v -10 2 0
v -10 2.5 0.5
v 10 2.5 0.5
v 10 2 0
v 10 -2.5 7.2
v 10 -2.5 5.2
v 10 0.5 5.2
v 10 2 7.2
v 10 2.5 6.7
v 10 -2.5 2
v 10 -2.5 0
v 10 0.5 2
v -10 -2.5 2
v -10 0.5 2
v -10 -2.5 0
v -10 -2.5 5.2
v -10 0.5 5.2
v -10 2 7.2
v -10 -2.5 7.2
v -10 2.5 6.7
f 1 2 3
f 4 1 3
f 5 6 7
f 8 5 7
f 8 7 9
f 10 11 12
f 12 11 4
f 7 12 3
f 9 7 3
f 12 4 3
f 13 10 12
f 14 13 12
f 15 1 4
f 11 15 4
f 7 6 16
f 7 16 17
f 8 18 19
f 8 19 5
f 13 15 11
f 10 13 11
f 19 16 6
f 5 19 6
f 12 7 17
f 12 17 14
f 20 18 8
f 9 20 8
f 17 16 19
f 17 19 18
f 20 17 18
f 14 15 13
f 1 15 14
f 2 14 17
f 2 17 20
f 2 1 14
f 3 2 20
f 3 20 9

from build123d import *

# Parameters (mm, degrees)
SKETCH2_W           = 20
SKETCH2_H           = 5
BOSS_EXTRUDE1_DEPTH = 7.2
CUT_EXTRUDE1_REACH  = 23.403
SKETCH3_W           = 3.2
SKETCH3_H           = 3
CHAMFER1_SIZE       = 0.5


with BuildPart() as part:
    # Sketch2 → Boss-Extrude1 (new body)
    with BuildSketch(Plane.XY):
        Rectangle(SKETCH2_W, SKETCH2_H)
    extrude(amount=BOSS_EXTRUDE1_DEPTH)

    # Sketch3 → Cut-Extrude1 (cut, up to next)
    with BuildSketch(Plane(origin=(10, 0, 0), x_dir=(0, 0, -1), z_dir=(1, 0, 0)), mode=Mode.PRIVATE) as cut_extrude1_sk1:
        with Locations((-3.6, -1)):
            Rectangle(SKETCH3_W, SKETCH3_H)
    cut_extrude1_tool1 = extrude(cut_extrude1_sk1.sketch, amount=-CUT_EXTRUDE1_REACH, mode=Mode.PRIVATE) & part.part
    add(cut_extrude1_tool1.solids().sort_by_distance((10, -1, 3.6))[0], mode=Mode.SUBTRACT)

    # Chamfer1
    chamfer1_edges = [part.edges().sort_by_distance(p)[0] for p in [
        (0, 2.5, 0),
        (0, 2.5, 7.2),
    ]]
    chamfer(chamfer1_edges, length=CHAMFER1_SIZE)


solid = part.part
